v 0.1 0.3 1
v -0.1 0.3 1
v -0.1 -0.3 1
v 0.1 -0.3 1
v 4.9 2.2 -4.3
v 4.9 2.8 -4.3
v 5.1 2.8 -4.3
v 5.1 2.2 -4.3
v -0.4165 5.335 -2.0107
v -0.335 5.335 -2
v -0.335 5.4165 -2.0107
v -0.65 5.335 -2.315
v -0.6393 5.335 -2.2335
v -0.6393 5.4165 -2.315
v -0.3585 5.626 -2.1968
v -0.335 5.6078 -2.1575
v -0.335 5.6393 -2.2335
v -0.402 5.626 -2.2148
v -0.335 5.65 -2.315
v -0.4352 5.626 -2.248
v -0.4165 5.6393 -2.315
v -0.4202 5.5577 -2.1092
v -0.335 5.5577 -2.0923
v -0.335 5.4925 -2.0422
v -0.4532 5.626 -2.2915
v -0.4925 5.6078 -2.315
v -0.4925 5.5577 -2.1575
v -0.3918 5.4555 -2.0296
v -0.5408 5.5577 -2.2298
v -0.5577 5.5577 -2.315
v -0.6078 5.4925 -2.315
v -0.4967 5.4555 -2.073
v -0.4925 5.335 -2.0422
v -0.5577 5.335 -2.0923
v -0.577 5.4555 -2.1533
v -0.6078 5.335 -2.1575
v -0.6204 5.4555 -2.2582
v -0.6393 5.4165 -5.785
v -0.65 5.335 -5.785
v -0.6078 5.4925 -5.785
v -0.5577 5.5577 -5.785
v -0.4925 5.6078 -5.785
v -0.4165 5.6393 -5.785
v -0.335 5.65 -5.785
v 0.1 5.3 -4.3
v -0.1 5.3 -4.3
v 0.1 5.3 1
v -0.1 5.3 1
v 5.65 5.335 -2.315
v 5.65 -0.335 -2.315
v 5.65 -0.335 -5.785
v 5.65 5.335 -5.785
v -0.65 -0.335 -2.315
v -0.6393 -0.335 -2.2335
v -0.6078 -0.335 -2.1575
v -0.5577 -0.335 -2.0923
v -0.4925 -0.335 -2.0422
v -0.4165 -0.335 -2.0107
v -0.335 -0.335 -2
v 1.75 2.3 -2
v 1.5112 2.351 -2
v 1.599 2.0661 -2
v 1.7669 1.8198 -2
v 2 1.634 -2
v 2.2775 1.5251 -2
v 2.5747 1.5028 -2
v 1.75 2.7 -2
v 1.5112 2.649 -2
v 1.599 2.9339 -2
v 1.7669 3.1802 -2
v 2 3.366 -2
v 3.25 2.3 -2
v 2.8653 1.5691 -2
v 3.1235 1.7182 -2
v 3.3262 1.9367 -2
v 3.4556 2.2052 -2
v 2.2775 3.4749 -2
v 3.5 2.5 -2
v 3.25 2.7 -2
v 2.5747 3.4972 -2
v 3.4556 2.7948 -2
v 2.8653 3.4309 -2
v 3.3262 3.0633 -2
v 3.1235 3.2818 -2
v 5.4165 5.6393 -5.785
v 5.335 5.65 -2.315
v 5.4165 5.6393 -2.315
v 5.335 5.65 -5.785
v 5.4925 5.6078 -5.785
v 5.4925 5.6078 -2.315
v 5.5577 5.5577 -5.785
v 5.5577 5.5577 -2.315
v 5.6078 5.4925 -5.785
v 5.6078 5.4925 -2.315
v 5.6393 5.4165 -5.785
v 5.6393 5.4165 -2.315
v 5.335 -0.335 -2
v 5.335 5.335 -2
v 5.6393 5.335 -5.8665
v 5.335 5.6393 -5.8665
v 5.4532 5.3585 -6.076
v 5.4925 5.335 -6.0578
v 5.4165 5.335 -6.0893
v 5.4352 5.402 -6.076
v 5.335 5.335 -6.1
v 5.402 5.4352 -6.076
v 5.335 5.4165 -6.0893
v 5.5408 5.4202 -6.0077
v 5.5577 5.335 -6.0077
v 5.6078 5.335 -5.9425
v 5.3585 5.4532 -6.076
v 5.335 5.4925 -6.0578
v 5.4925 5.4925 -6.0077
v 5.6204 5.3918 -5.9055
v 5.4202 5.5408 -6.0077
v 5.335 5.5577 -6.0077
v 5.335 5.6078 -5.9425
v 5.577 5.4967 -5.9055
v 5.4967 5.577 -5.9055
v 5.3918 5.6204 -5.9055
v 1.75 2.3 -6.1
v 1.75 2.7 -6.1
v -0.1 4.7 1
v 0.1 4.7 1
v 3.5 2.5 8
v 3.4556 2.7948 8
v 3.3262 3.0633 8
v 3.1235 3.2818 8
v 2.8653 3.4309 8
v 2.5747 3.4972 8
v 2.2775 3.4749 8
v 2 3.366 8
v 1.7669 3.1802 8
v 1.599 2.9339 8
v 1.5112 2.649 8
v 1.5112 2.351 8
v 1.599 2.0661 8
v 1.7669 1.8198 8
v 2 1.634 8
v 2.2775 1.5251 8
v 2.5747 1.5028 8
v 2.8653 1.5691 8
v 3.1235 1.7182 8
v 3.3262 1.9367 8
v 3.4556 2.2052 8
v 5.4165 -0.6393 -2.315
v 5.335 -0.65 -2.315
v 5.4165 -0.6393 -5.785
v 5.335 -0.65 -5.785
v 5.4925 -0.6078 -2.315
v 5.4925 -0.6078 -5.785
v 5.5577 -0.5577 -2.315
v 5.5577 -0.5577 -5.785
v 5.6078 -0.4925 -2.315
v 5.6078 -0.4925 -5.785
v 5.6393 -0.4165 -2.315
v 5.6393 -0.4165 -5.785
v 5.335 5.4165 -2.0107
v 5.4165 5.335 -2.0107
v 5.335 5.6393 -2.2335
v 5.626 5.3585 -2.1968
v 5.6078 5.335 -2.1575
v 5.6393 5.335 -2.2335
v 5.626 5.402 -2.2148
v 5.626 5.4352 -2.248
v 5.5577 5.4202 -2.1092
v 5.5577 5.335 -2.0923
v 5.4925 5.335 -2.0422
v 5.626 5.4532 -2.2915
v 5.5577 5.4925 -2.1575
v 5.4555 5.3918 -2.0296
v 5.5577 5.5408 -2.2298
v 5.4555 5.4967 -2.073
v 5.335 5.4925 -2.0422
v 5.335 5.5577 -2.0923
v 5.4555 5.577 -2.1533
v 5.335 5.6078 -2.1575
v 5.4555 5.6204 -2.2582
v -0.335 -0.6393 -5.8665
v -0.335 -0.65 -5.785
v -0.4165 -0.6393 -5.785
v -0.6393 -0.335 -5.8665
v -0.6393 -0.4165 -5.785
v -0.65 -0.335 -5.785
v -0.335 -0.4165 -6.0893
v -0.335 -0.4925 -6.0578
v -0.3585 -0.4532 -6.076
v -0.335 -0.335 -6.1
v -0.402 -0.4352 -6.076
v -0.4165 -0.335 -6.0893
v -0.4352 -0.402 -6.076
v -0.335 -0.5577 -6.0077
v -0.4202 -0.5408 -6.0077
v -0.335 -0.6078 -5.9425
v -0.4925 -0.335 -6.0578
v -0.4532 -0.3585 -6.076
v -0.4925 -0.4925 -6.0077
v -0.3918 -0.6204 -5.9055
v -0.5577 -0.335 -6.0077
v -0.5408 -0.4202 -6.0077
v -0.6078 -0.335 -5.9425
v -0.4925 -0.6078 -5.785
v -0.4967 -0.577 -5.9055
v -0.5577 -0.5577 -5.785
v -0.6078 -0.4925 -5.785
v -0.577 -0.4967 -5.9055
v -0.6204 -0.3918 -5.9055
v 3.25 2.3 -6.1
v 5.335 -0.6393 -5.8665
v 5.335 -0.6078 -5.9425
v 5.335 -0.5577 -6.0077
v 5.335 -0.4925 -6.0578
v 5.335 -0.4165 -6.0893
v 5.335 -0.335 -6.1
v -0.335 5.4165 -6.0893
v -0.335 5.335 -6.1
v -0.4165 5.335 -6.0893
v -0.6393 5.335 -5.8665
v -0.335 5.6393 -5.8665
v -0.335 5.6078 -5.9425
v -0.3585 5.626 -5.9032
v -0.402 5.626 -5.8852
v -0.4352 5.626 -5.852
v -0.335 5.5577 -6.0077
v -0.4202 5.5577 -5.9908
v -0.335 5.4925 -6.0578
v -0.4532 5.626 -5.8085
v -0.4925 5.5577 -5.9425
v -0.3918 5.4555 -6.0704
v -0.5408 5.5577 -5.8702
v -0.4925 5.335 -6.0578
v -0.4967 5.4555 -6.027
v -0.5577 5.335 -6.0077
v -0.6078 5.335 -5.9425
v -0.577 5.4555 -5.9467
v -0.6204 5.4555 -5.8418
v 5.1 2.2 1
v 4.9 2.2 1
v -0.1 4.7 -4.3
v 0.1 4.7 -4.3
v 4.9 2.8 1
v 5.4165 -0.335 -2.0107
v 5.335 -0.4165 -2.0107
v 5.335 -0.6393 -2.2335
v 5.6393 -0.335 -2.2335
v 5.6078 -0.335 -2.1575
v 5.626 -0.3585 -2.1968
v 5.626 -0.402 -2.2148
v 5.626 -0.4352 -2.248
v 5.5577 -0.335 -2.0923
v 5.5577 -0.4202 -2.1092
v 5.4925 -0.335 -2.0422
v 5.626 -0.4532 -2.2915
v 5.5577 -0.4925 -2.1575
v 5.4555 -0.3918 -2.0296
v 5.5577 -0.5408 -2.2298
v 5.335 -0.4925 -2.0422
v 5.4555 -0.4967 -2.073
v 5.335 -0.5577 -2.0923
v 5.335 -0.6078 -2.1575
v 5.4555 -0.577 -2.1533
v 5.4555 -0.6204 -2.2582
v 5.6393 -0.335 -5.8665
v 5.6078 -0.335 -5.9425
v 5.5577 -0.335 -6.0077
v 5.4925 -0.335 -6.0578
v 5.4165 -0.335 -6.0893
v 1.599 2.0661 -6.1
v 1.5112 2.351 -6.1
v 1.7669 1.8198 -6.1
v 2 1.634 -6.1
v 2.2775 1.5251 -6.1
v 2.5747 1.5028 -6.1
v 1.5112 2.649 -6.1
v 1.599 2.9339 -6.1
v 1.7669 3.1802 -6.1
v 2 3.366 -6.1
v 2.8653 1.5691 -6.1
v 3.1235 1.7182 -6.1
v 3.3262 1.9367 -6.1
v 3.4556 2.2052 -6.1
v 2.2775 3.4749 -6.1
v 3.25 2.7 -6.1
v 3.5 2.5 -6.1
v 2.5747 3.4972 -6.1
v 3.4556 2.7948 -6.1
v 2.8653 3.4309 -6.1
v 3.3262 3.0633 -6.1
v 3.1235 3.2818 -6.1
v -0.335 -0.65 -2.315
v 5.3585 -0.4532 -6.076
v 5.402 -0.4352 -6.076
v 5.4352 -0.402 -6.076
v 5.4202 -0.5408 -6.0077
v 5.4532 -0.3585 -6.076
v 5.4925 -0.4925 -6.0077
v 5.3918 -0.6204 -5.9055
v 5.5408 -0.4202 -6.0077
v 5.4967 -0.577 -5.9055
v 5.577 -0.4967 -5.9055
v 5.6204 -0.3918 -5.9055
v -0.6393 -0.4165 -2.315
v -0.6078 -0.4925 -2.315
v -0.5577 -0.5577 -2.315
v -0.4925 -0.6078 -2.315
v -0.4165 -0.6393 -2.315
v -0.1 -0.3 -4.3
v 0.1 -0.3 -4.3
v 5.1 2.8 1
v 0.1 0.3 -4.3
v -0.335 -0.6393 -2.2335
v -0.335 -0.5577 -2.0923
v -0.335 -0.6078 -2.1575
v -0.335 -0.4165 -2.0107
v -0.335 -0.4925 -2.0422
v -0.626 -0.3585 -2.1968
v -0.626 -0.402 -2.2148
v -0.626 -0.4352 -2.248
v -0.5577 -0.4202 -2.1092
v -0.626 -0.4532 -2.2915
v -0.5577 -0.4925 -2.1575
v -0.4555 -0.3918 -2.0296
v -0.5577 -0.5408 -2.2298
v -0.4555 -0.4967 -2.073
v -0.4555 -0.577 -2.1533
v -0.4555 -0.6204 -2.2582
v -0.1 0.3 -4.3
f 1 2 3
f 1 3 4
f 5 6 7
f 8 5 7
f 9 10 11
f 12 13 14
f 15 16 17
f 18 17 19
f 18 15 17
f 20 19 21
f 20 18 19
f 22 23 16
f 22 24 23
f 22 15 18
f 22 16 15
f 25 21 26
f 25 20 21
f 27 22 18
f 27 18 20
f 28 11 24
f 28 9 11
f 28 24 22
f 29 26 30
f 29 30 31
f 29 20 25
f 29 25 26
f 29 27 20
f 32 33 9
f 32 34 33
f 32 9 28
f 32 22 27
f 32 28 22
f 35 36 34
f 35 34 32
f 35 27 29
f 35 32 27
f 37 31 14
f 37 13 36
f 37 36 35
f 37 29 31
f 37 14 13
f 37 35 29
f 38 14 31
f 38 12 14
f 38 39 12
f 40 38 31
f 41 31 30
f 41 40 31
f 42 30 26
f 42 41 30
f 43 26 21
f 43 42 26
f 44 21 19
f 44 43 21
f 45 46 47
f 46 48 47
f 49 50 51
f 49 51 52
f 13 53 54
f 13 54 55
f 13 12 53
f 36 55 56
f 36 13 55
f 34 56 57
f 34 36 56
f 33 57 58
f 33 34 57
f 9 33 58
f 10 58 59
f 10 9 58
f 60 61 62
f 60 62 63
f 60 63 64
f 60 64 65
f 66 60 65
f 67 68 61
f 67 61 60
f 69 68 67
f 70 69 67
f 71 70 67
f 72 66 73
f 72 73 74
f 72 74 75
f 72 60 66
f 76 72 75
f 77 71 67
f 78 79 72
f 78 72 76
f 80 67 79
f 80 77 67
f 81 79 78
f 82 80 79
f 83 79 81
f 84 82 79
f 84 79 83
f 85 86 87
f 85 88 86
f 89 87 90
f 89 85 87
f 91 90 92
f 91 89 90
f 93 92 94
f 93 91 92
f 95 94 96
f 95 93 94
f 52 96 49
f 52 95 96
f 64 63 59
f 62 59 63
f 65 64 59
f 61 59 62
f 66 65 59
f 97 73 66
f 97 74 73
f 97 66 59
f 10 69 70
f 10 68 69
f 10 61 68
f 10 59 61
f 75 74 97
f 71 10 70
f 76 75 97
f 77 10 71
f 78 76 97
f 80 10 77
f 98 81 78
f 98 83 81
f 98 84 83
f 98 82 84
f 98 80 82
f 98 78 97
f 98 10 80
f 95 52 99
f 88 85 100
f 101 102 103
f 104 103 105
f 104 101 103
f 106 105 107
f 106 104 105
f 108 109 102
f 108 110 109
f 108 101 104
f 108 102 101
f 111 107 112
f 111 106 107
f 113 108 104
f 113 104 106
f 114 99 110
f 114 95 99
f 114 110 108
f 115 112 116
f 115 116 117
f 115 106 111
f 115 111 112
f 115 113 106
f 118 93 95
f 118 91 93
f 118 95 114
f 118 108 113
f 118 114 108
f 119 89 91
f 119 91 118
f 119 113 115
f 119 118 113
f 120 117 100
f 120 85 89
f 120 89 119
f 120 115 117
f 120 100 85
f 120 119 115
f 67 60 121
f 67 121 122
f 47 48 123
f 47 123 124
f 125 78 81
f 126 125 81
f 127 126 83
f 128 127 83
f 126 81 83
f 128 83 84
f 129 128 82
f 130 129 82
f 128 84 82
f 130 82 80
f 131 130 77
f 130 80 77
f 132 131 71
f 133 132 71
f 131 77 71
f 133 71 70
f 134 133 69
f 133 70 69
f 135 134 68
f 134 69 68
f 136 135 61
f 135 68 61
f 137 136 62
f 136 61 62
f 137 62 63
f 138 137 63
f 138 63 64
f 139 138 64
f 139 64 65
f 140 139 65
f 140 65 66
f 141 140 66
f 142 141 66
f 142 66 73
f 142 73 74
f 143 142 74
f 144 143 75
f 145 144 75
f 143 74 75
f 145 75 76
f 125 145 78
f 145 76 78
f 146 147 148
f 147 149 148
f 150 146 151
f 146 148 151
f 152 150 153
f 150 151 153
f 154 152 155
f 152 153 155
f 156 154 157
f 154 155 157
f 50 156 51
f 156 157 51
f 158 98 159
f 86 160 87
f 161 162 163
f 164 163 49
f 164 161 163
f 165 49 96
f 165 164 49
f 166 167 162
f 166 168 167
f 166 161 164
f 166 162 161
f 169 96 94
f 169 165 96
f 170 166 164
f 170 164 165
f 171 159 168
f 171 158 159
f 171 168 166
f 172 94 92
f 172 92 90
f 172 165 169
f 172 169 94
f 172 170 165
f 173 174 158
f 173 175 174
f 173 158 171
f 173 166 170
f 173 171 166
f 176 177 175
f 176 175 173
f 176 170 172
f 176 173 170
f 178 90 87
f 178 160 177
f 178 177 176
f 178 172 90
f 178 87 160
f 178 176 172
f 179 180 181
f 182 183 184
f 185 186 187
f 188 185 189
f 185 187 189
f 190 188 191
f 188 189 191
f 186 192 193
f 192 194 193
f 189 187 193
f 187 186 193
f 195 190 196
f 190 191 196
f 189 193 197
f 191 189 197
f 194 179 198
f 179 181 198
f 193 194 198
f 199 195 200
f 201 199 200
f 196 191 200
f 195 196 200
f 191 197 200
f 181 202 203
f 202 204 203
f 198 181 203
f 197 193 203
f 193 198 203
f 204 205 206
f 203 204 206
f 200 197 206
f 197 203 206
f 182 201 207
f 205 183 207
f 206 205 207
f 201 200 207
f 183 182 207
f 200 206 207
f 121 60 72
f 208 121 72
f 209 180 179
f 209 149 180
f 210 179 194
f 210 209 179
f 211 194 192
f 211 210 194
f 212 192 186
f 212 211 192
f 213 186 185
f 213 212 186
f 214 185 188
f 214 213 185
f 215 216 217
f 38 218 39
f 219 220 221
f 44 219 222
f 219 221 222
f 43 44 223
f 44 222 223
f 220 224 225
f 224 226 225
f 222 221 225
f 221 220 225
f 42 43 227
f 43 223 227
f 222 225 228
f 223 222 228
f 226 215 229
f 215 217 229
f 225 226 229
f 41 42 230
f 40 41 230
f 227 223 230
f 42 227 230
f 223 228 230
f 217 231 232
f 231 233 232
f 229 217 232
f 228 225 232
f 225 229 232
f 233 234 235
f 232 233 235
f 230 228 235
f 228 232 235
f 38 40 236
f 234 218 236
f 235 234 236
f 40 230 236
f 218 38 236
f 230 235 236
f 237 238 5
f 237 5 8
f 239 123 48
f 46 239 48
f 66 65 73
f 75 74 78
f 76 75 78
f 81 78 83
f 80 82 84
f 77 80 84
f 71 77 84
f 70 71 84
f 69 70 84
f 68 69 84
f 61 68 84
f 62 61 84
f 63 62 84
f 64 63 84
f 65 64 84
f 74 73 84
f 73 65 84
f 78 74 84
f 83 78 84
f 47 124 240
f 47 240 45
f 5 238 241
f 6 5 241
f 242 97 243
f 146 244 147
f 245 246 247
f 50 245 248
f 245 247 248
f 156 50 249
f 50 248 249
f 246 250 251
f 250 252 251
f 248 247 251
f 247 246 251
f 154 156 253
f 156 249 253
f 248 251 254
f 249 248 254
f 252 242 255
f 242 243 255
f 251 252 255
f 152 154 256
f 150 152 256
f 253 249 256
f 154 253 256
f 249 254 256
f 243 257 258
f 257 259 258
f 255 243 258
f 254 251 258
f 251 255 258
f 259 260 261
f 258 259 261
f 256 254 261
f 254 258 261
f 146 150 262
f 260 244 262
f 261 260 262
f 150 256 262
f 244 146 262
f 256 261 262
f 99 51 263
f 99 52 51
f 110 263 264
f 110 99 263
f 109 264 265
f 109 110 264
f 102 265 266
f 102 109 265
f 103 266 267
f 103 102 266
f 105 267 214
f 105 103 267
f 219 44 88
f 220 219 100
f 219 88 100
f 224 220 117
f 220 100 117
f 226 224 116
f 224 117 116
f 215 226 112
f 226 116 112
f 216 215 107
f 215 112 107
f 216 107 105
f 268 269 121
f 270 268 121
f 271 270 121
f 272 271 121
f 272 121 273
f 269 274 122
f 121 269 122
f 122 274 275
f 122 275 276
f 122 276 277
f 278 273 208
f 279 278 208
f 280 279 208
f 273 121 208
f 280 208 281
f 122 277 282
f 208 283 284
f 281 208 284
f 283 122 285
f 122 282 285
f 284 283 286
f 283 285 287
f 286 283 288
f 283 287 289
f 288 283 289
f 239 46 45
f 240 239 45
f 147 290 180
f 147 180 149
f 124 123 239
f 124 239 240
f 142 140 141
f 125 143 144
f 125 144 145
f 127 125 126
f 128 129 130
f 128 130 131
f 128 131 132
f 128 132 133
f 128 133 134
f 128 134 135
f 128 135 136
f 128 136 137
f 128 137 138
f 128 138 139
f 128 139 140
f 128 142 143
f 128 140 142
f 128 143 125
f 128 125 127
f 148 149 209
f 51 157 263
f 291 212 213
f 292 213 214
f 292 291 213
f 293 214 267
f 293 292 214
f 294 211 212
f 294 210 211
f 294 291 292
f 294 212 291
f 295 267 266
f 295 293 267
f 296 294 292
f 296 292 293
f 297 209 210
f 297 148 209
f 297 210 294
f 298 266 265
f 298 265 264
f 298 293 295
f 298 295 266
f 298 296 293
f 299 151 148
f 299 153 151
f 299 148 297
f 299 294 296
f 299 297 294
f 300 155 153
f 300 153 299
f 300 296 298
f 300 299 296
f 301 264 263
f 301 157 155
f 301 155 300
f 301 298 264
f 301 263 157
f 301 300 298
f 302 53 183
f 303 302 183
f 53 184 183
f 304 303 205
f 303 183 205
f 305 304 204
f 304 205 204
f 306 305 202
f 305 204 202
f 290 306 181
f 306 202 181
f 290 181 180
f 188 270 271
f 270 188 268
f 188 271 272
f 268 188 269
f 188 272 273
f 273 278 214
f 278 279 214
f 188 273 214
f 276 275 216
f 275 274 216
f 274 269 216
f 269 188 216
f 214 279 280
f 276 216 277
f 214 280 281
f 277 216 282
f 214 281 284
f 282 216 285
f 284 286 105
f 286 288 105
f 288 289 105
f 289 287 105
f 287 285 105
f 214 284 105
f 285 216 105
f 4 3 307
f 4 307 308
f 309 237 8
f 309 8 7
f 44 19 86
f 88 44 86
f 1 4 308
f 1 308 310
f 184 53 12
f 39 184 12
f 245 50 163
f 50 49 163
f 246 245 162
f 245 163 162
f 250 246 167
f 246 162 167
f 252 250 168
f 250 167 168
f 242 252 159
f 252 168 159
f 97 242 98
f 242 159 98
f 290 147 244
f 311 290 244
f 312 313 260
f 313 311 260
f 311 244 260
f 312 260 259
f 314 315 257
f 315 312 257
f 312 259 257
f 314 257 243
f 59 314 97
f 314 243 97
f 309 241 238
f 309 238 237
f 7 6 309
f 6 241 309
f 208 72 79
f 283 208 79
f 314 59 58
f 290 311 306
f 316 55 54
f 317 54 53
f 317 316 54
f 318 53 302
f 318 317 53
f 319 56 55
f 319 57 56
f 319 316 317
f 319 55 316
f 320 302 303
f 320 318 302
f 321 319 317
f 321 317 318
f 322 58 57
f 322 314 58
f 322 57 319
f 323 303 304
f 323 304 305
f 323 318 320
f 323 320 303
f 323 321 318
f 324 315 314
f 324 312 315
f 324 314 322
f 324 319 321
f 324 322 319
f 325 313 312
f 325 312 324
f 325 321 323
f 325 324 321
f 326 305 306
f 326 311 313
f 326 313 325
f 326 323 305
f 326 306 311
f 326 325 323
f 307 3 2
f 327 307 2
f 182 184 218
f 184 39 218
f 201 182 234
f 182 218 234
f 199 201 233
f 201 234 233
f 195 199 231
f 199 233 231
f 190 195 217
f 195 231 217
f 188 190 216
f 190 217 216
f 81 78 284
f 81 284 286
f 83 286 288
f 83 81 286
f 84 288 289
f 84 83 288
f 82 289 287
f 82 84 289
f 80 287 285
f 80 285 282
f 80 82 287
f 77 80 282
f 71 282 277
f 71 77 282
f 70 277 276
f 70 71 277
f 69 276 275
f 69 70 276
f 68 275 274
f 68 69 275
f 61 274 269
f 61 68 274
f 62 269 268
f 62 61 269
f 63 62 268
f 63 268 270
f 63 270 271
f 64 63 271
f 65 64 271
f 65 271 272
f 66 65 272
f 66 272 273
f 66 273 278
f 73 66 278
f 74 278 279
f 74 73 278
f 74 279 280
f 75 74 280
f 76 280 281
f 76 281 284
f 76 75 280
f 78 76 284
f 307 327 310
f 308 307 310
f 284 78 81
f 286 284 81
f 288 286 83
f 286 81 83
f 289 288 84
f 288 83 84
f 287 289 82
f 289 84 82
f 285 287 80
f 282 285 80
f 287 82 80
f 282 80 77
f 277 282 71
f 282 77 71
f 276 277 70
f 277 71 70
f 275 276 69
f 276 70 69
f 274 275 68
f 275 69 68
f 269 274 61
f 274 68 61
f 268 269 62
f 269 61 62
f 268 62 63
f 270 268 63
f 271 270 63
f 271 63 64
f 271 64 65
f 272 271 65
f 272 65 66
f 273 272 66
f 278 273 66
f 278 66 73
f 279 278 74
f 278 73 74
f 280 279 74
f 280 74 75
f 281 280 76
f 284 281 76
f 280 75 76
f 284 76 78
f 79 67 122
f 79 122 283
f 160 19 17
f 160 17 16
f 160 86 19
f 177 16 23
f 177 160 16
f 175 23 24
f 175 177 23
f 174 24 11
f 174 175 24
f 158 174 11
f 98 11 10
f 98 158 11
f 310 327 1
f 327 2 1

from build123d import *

# Parameters (mm, degrees)
SKETCH003_W       = 0.2
SKETCH003_H       = 0.6
PAD002_DEPTH      = 1
PAD002_DEPTH_BACK = 4.3
SKETCH004_R       = 1
SKETCH004_W       = 1.5
SKETCH004_H       = 0.4
PAD003_DEPTH      = 4.1
SKETCH006_R       = 1
PAD005_DEPTH      = 10
SKETCH_W          = 6.3
SKETCH_H          = 6.3
SKETCH_R          = 1
PAD_DEPTH         = 4.1
FILLET_R          = 0.315


with BuildPart() as pad002:
    # Sketch003 → Pad002 (new body, two sides)
    with BuildSketch(Plane(origin=(0, 5, 0), x_dir=(1, 0, 0), z_dir=(0, 0, 1))) as pad002_sk:
        Rectangle(SKETCH003_W, SKETCH003_H)
        with Locations((5, -2.5)):
            Rectangle(SKETCH003_W, SKETCH003_H)
        with Locations((0, -5)):
            Rectangle(SKETCH003_W, SKETCH003_H)
    extrude(amount=PAD002_DEPTH)
    extrude(pad002_sk.sketch, amount=-PAD002_DEPTH_BACK)


with BuildPart() as pad003:
    # Sketch004 → Pad003 (new body)
    with BuildSketch(Plane(origin=(0, 5, -2), x_dir=(1, 0, 0), z_dir=(0, 0, 1))):
        with Locations((2.5, -2.5)):
            Circle(SKETCH004_R)
        with Locations((2.5, -2.5)):
            Rectangle(SKETCH004_W, SKETCH004_H, mode=Mode.SUBTRACT)
    extrude(amount=-PAD003_DEPTH)


with BuildPart() as pad005:
    # Sketch006 → Pad005 (new body)
    with BuildSketch(Plane(origin=(0, 5, -2), x_dir=(1, 0, 0), z_dir=(0, 0, 1))):
        with Locations((2.5, -2.5)):
            Circle(SKETCH006_R)
    extrude(amount=PAD005_DEPTH)


with BuildPart() as fillet_body:
    # Sketch → Pad (new body)
    with BuildSketch(Plane(origin=(0, 5, -2), x_dir=(1, 0, 0), z_dir=(0, 0, 1))):
        with Locations((2.5, -2.5)):
            Rectangle(SKETCH_W, SKETCH_H)
        with Locations((2.5, -2.5)):
            Circle(SKETCH_R, mode=Mode.SUBTRACT)
    extrude(amount=-PAD_DEPTH)

    # Fillet
    fillet_edges = [fillet_body.edges().sort_by_distance(p)[0] for p in [
        (2.5, -0.65, -2),
        (-0.65, 2.5, -2),
        (2.5, 5.65, -2),
        (5.65, 2.5, -2),
        (5.65, 5.65, -4.05),
        (5.65, -0.65, -4.05),
        (-0.65, -0.65, -4.05),
        (2.5, -0.65, -6.1),
        (5.65, 2.5, -6.1),
        (-0.65, 2.5, -6.1),
        (2.5, 5.65, -6.1),
        (-0.65, 5.65, -4.05),
    ]]
    fillet(fillet_edges, radius=FILLET_R)


solid = Compound([pad002.part, pad003.part, pad005.part, fillet_body.part])
